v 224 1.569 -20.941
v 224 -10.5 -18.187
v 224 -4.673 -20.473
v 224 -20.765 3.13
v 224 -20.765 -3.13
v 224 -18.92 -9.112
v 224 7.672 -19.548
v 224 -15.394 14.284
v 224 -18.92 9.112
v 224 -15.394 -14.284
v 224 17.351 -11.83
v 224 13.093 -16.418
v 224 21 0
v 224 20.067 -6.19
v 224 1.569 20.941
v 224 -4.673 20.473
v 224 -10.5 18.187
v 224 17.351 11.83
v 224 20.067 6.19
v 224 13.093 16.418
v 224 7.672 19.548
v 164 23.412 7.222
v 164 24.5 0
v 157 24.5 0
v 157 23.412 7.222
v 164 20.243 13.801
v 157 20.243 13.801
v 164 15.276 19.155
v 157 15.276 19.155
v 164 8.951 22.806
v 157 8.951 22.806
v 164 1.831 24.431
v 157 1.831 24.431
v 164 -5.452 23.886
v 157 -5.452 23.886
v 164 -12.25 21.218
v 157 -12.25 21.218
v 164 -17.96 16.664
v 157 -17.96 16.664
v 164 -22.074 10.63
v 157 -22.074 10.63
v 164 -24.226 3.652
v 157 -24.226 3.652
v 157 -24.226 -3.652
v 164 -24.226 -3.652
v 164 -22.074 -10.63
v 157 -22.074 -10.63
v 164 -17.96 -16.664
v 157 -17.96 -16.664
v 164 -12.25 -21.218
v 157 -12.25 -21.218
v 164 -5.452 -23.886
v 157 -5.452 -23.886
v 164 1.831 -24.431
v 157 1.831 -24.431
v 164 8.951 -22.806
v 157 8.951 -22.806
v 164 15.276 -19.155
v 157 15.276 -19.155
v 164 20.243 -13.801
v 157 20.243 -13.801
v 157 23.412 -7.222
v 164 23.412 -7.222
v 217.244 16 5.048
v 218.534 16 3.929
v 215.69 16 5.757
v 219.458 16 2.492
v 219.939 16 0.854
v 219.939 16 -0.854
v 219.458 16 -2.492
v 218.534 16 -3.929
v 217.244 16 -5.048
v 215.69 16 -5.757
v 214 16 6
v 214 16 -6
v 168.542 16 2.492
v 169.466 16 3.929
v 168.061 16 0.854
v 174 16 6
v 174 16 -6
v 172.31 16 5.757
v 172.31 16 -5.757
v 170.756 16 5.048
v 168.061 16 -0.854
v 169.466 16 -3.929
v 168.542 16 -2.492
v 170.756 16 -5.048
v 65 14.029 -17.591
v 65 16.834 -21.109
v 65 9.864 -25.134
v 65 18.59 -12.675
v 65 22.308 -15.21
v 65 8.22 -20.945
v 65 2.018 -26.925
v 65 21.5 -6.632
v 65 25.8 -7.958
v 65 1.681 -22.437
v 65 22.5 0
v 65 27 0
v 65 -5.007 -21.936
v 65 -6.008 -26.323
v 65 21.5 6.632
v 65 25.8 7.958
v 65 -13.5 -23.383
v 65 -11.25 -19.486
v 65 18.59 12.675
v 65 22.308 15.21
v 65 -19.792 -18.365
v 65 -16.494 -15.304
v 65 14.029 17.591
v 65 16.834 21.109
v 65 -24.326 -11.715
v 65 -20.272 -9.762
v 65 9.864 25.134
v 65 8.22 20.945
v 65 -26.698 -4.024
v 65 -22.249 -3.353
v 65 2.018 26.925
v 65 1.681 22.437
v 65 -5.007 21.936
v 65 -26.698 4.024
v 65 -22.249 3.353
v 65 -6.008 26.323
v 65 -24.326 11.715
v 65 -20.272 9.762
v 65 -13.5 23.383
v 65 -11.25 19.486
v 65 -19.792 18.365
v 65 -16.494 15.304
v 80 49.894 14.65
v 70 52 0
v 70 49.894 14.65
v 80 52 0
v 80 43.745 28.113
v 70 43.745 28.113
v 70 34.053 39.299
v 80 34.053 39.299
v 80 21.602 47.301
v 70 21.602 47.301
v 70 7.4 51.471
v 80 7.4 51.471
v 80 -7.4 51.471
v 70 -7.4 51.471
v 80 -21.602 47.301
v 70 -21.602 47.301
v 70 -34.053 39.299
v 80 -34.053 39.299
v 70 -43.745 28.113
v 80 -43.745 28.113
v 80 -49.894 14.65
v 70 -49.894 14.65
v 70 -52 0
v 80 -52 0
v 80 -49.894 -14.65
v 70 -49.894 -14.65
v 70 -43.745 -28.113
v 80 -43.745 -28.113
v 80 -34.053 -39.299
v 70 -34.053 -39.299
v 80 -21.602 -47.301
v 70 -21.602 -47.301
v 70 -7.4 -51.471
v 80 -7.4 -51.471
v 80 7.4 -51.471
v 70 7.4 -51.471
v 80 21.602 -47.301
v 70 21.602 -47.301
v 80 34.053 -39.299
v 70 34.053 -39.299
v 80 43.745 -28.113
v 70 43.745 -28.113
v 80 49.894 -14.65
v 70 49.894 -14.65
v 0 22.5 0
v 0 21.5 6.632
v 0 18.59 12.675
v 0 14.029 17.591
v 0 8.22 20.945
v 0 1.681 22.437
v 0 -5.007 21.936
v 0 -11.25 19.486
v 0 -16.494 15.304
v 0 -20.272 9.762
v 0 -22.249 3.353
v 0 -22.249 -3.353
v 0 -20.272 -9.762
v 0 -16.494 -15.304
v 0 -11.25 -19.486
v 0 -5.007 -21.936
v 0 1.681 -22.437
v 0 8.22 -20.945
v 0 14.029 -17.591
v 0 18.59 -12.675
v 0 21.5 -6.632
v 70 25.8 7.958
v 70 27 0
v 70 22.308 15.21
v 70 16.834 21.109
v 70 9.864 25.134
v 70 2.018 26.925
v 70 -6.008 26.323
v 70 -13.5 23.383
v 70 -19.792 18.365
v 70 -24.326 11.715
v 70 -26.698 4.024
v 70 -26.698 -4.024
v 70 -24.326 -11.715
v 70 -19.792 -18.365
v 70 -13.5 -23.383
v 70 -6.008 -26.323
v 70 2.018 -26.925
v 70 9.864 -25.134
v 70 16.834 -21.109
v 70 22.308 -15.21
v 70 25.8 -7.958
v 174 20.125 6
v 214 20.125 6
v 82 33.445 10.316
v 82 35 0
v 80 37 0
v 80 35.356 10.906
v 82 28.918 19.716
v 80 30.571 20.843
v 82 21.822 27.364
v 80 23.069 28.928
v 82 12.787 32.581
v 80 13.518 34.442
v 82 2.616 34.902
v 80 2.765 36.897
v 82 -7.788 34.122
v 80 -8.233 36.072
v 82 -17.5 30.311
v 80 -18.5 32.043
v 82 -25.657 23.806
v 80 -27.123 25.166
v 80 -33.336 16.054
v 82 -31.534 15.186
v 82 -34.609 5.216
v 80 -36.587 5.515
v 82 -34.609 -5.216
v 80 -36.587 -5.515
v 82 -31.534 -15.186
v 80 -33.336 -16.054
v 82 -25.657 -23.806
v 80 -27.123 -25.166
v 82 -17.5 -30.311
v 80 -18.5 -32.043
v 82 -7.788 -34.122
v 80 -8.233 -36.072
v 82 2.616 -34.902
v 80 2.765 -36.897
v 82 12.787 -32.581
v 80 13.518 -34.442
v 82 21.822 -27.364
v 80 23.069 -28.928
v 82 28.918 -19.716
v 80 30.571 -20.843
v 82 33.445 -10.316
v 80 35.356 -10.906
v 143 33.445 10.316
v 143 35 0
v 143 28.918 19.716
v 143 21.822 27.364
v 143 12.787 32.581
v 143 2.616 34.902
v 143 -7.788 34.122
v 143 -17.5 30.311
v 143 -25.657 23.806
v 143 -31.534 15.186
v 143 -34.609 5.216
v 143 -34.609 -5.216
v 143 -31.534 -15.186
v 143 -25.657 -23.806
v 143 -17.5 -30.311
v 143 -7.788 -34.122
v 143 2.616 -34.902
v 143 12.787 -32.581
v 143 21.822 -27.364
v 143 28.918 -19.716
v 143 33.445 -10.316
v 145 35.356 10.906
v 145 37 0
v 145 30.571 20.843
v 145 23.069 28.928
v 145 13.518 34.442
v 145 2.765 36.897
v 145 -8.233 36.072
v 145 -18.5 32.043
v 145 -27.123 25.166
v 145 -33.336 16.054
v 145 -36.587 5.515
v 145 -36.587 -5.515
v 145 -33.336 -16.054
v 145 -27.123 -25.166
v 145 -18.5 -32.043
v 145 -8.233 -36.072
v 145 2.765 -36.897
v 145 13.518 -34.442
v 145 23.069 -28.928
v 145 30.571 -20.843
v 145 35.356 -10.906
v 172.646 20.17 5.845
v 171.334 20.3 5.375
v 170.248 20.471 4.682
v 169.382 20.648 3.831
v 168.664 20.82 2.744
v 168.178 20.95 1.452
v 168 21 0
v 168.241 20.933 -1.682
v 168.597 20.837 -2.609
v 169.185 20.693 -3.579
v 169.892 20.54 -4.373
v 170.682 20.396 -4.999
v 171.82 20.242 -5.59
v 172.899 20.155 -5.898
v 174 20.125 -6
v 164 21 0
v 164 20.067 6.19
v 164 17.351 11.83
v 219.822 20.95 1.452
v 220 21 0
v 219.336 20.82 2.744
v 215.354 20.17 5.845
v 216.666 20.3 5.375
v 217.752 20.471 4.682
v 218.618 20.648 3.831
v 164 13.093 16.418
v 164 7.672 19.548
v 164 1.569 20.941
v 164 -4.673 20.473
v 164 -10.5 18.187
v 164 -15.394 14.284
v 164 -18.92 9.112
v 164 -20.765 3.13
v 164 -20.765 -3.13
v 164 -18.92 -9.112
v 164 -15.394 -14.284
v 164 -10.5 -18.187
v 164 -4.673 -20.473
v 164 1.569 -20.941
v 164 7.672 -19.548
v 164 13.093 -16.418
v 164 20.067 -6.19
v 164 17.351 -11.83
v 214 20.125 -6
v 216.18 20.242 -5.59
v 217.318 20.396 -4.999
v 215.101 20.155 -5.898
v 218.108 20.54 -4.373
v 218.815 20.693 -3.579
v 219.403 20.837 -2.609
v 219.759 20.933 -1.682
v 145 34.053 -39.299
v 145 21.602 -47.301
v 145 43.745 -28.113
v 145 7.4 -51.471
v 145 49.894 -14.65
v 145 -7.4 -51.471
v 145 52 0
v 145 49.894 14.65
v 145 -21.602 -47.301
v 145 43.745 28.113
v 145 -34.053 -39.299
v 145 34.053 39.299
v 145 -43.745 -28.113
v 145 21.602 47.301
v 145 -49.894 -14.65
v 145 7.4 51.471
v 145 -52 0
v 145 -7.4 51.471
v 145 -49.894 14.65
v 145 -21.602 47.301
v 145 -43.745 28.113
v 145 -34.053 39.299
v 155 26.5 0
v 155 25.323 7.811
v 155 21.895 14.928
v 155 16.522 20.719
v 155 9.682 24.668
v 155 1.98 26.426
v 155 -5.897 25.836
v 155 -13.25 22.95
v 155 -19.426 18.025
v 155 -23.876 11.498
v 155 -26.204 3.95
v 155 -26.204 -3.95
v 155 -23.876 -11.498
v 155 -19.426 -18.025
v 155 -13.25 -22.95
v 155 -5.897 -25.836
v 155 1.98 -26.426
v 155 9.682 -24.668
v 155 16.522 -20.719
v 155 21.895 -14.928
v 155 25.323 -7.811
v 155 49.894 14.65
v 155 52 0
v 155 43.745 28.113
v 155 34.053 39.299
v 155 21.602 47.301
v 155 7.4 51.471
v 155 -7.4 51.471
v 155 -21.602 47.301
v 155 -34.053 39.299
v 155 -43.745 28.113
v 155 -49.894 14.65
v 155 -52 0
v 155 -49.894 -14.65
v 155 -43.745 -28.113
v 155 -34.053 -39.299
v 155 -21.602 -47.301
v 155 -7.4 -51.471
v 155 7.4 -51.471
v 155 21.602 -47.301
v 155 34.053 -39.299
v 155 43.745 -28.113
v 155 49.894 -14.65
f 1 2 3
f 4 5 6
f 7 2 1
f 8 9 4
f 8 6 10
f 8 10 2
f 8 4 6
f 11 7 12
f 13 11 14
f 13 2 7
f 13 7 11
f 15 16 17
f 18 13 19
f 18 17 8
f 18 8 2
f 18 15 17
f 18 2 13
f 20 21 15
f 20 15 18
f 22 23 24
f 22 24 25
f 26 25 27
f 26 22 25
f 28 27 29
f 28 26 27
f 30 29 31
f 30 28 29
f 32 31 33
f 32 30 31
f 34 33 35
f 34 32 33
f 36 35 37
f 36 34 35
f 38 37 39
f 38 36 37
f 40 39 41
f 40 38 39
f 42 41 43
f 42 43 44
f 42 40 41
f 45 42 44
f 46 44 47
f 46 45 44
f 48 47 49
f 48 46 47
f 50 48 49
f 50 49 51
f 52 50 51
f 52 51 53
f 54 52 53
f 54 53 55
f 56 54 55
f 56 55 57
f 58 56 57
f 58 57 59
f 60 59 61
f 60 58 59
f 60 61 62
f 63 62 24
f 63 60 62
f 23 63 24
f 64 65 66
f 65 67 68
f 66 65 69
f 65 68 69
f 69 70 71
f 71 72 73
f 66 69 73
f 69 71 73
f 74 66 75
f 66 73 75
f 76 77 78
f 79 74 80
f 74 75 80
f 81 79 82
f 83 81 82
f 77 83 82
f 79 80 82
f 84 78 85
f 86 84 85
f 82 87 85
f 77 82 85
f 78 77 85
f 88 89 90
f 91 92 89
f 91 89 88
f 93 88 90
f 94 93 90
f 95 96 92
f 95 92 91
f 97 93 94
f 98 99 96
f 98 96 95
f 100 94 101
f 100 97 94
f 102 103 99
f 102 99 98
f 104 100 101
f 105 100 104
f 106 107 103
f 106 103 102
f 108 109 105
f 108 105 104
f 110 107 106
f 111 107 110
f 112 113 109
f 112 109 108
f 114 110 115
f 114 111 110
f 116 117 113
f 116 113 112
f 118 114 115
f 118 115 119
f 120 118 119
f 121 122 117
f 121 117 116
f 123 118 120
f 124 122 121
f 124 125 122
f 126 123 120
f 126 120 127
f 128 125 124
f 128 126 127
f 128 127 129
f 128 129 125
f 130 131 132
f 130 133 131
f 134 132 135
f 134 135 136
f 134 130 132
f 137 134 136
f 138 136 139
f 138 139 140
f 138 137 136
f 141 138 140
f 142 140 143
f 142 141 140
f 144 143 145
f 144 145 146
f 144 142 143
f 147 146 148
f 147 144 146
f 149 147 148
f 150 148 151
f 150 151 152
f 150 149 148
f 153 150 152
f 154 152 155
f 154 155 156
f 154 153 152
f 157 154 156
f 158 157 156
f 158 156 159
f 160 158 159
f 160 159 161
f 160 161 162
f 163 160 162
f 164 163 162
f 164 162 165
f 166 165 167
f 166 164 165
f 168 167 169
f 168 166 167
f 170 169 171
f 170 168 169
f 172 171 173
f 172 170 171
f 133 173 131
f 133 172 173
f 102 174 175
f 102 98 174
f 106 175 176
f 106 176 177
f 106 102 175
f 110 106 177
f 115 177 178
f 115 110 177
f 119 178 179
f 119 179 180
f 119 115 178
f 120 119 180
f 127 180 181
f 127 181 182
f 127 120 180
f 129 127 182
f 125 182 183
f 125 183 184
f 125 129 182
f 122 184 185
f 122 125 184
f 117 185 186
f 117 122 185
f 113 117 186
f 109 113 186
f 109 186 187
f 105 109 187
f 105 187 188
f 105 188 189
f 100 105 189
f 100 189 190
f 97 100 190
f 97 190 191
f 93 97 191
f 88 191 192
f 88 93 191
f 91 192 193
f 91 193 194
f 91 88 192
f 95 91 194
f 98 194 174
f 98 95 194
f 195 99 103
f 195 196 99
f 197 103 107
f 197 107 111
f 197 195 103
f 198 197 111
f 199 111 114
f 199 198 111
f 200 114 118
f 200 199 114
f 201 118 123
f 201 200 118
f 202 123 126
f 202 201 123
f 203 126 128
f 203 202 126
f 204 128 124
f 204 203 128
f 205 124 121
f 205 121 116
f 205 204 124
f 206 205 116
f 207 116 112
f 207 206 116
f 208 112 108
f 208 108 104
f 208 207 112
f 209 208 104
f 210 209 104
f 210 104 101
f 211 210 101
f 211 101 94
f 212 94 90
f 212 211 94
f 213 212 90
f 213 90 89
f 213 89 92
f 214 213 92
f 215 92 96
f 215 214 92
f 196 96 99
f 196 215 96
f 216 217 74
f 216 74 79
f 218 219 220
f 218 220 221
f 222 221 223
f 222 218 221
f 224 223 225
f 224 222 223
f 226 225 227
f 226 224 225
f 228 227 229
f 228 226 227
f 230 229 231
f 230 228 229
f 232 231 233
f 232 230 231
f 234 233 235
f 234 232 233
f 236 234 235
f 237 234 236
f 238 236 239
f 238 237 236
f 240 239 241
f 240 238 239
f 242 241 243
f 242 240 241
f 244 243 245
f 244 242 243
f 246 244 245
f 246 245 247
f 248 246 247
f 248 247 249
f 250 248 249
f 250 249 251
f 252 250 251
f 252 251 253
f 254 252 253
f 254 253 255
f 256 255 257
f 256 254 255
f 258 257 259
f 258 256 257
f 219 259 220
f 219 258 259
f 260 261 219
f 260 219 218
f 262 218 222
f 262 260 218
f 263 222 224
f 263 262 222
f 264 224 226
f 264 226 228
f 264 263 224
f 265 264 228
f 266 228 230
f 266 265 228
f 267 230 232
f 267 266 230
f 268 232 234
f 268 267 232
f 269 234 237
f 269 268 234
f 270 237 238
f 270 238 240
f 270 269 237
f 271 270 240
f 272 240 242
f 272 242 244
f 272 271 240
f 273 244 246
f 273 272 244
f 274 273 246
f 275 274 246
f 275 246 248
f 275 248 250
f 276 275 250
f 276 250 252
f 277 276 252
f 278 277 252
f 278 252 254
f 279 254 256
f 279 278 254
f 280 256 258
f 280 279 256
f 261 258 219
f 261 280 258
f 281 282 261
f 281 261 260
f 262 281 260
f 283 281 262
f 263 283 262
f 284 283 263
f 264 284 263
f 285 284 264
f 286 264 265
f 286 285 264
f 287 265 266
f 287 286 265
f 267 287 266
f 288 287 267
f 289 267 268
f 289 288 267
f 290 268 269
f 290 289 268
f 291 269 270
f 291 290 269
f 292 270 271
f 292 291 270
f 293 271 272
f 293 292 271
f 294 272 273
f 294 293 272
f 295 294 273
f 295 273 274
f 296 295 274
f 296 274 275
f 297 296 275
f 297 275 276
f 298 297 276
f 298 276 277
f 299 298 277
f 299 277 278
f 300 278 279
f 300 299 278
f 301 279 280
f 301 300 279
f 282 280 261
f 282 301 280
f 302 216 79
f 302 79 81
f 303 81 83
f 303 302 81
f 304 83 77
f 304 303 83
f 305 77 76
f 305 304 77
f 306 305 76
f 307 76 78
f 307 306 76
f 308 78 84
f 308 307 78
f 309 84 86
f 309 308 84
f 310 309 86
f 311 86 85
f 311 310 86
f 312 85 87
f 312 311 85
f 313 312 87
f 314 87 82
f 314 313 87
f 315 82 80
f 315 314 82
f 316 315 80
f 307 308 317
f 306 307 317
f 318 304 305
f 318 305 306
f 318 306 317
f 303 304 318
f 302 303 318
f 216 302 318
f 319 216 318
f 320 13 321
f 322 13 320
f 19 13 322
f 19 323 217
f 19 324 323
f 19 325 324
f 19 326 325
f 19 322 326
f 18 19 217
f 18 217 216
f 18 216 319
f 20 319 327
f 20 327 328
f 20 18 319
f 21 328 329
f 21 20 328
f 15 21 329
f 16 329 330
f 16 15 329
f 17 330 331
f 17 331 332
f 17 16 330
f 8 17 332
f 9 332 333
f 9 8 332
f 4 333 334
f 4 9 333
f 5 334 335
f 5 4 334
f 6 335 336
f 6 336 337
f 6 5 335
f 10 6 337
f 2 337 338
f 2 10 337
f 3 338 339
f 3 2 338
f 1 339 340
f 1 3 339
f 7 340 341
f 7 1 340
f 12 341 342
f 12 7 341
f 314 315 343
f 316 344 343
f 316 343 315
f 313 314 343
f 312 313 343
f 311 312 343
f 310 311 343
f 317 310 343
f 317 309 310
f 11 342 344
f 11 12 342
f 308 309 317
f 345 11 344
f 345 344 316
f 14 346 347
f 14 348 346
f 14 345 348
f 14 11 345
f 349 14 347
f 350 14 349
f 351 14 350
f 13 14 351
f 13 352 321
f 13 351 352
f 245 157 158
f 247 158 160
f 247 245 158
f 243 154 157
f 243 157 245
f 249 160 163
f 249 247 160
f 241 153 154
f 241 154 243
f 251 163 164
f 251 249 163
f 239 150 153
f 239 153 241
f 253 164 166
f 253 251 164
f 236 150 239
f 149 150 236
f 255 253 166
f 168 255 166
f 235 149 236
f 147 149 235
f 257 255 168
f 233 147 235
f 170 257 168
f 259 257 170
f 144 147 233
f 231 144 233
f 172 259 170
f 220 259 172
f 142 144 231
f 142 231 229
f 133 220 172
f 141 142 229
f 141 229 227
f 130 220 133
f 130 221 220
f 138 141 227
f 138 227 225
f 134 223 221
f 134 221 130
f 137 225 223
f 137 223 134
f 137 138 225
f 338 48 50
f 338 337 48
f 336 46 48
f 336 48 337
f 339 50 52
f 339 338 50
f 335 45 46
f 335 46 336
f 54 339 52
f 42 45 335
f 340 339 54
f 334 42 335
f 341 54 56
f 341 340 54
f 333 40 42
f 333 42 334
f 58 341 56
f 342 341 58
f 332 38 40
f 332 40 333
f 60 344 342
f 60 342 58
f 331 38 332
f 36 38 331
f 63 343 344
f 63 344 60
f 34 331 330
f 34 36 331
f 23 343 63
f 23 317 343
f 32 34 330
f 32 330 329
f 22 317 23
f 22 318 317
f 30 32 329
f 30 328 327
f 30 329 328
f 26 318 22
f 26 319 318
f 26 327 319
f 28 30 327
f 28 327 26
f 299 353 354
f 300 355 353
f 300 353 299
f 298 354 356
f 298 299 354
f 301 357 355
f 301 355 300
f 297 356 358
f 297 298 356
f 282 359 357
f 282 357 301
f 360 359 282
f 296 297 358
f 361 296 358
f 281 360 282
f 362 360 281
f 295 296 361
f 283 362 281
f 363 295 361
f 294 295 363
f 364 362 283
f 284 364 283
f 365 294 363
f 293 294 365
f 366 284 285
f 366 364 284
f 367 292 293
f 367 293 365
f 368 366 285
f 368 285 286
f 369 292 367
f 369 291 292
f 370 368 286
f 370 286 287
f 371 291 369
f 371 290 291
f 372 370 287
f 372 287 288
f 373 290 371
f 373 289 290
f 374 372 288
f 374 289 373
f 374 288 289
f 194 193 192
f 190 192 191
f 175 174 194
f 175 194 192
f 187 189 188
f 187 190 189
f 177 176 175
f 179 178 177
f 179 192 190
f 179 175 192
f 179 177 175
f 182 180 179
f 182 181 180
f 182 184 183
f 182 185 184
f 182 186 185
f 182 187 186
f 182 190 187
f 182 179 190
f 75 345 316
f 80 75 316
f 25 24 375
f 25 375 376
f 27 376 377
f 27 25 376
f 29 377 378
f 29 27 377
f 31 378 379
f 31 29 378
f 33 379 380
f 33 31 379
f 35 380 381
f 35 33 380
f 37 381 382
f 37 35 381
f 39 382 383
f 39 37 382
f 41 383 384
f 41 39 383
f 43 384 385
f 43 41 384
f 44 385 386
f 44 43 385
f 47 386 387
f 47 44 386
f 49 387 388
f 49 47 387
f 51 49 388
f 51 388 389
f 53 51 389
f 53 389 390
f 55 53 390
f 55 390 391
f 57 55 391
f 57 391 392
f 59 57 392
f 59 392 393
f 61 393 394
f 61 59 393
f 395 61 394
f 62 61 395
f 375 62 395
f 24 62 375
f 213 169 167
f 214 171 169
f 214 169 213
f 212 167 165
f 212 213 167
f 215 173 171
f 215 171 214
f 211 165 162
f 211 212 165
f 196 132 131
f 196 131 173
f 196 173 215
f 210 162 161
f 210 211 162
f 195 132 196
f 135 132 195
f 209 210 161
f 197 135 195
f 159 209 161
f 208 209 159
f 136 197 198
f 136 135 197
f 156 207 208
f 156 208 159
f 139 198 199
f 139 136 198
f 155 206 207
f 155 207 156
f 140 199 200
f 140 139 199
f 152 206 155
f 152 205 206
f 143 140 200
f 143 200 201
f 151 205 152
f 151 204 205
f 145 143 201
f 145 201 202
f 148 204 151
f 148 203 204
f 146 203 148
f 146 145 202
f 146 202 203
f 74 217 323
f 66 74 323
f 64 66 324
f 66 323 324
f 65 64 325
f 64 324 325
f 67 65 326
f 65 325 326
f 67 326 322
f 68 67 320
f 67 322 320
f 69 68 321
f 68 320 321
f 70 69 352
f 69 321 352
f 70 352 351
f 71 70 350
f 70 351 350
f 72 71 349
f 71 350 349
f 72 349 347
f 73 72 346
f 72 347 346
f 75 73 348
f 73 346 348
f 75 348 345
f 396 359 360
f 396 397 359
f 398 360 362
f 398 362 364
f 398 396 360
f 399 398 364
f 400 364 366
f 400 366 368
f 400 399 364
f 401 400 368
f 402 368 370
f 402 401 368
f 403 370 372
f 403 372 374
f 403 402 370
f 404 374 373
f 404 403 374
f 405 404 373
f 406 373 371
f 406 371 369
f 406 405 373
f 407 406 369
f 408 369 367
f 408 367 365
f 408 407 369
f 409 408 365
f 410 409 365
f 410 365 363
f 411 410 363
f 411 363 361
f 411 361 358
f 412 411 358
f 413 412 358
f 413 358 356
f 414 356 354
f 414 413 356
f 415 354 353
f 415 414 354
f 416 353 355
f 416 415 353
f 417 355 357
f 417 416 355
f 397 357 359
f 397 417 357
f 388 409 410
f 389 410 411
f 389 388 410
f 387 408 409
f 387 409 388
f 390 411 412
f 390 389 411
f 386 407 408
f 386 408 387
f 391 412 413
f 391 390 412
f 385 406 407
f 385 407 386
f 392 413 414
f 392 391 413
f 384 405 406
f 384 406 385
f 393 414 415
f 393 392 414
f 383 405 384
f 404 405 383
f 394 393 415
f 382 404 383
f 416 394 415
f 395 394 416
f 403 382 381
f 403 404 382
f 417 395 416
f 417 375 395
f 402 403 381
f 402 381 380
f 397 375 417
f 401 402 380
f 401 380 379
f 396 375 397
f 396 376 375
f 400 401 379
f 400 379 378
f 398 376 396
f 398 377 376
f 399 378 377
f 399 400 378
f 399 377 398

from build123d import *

# Parameters (mm, degrees)
CHAMFER1_SIZE      = 2
CUT_EXTRUDE1_DEPTH = 5


with BuildPart() as part:
    # Sketch1 → Revolve1 (revolve)
    with BuildSketch(Plane.XY):
        Polygon((0, 0), (0, 22.5), (65, 22.5), (65, 27), (70, 27), (70, 52), (80, 52), (80, 35), (145, 35), (145, 52), (155, 52), (155, 24.5), (164, 24.5), (164, 21), (224, 21), (224, 0), align=None)
    revolve(axis=Axis((0, 0, 0), (1, 0, 0)))

    # Chamfer1
    chamfer1_edges = [part.edges().sort_by_distance(p)[0] for p in [
        (155, -24.5, 0),
        (145, -35, 0),
        (80, -35, 0),
    ]]
    chamfer(chamfer1_edges, length=CHAMFER1_SIZE)

    # Sketch2 → Cut-Extrude1 (cut)
    with BuildSketch(Plane(origin=(0, 21, 0), x_dir=(1, 0, 0), z_dir=(0, 1, 0))):
        with BuildLine():
            Line((194, 6), (194, -6))
            Line((194, -6), (174, -6))
            ThreePointArc((174, -6), (168, 0), (174, 6))
            Line((174, 6), (194, 6))
        make_face()
    cut_extrude1 = extrude(amount=-CUT_EXTRUDE1_DEPTH, mode=Mode.SUBTRACT)

    # Mirror1: Cut-Extrude1 across plane
    add(cut_extrude1.mirror(Plane(origin=(194, 16, -6), x_dir=(0, 0, 1), z_dir=(1, 0, 0))), mode=Mode.SUBTRACT)


solid = part.part
